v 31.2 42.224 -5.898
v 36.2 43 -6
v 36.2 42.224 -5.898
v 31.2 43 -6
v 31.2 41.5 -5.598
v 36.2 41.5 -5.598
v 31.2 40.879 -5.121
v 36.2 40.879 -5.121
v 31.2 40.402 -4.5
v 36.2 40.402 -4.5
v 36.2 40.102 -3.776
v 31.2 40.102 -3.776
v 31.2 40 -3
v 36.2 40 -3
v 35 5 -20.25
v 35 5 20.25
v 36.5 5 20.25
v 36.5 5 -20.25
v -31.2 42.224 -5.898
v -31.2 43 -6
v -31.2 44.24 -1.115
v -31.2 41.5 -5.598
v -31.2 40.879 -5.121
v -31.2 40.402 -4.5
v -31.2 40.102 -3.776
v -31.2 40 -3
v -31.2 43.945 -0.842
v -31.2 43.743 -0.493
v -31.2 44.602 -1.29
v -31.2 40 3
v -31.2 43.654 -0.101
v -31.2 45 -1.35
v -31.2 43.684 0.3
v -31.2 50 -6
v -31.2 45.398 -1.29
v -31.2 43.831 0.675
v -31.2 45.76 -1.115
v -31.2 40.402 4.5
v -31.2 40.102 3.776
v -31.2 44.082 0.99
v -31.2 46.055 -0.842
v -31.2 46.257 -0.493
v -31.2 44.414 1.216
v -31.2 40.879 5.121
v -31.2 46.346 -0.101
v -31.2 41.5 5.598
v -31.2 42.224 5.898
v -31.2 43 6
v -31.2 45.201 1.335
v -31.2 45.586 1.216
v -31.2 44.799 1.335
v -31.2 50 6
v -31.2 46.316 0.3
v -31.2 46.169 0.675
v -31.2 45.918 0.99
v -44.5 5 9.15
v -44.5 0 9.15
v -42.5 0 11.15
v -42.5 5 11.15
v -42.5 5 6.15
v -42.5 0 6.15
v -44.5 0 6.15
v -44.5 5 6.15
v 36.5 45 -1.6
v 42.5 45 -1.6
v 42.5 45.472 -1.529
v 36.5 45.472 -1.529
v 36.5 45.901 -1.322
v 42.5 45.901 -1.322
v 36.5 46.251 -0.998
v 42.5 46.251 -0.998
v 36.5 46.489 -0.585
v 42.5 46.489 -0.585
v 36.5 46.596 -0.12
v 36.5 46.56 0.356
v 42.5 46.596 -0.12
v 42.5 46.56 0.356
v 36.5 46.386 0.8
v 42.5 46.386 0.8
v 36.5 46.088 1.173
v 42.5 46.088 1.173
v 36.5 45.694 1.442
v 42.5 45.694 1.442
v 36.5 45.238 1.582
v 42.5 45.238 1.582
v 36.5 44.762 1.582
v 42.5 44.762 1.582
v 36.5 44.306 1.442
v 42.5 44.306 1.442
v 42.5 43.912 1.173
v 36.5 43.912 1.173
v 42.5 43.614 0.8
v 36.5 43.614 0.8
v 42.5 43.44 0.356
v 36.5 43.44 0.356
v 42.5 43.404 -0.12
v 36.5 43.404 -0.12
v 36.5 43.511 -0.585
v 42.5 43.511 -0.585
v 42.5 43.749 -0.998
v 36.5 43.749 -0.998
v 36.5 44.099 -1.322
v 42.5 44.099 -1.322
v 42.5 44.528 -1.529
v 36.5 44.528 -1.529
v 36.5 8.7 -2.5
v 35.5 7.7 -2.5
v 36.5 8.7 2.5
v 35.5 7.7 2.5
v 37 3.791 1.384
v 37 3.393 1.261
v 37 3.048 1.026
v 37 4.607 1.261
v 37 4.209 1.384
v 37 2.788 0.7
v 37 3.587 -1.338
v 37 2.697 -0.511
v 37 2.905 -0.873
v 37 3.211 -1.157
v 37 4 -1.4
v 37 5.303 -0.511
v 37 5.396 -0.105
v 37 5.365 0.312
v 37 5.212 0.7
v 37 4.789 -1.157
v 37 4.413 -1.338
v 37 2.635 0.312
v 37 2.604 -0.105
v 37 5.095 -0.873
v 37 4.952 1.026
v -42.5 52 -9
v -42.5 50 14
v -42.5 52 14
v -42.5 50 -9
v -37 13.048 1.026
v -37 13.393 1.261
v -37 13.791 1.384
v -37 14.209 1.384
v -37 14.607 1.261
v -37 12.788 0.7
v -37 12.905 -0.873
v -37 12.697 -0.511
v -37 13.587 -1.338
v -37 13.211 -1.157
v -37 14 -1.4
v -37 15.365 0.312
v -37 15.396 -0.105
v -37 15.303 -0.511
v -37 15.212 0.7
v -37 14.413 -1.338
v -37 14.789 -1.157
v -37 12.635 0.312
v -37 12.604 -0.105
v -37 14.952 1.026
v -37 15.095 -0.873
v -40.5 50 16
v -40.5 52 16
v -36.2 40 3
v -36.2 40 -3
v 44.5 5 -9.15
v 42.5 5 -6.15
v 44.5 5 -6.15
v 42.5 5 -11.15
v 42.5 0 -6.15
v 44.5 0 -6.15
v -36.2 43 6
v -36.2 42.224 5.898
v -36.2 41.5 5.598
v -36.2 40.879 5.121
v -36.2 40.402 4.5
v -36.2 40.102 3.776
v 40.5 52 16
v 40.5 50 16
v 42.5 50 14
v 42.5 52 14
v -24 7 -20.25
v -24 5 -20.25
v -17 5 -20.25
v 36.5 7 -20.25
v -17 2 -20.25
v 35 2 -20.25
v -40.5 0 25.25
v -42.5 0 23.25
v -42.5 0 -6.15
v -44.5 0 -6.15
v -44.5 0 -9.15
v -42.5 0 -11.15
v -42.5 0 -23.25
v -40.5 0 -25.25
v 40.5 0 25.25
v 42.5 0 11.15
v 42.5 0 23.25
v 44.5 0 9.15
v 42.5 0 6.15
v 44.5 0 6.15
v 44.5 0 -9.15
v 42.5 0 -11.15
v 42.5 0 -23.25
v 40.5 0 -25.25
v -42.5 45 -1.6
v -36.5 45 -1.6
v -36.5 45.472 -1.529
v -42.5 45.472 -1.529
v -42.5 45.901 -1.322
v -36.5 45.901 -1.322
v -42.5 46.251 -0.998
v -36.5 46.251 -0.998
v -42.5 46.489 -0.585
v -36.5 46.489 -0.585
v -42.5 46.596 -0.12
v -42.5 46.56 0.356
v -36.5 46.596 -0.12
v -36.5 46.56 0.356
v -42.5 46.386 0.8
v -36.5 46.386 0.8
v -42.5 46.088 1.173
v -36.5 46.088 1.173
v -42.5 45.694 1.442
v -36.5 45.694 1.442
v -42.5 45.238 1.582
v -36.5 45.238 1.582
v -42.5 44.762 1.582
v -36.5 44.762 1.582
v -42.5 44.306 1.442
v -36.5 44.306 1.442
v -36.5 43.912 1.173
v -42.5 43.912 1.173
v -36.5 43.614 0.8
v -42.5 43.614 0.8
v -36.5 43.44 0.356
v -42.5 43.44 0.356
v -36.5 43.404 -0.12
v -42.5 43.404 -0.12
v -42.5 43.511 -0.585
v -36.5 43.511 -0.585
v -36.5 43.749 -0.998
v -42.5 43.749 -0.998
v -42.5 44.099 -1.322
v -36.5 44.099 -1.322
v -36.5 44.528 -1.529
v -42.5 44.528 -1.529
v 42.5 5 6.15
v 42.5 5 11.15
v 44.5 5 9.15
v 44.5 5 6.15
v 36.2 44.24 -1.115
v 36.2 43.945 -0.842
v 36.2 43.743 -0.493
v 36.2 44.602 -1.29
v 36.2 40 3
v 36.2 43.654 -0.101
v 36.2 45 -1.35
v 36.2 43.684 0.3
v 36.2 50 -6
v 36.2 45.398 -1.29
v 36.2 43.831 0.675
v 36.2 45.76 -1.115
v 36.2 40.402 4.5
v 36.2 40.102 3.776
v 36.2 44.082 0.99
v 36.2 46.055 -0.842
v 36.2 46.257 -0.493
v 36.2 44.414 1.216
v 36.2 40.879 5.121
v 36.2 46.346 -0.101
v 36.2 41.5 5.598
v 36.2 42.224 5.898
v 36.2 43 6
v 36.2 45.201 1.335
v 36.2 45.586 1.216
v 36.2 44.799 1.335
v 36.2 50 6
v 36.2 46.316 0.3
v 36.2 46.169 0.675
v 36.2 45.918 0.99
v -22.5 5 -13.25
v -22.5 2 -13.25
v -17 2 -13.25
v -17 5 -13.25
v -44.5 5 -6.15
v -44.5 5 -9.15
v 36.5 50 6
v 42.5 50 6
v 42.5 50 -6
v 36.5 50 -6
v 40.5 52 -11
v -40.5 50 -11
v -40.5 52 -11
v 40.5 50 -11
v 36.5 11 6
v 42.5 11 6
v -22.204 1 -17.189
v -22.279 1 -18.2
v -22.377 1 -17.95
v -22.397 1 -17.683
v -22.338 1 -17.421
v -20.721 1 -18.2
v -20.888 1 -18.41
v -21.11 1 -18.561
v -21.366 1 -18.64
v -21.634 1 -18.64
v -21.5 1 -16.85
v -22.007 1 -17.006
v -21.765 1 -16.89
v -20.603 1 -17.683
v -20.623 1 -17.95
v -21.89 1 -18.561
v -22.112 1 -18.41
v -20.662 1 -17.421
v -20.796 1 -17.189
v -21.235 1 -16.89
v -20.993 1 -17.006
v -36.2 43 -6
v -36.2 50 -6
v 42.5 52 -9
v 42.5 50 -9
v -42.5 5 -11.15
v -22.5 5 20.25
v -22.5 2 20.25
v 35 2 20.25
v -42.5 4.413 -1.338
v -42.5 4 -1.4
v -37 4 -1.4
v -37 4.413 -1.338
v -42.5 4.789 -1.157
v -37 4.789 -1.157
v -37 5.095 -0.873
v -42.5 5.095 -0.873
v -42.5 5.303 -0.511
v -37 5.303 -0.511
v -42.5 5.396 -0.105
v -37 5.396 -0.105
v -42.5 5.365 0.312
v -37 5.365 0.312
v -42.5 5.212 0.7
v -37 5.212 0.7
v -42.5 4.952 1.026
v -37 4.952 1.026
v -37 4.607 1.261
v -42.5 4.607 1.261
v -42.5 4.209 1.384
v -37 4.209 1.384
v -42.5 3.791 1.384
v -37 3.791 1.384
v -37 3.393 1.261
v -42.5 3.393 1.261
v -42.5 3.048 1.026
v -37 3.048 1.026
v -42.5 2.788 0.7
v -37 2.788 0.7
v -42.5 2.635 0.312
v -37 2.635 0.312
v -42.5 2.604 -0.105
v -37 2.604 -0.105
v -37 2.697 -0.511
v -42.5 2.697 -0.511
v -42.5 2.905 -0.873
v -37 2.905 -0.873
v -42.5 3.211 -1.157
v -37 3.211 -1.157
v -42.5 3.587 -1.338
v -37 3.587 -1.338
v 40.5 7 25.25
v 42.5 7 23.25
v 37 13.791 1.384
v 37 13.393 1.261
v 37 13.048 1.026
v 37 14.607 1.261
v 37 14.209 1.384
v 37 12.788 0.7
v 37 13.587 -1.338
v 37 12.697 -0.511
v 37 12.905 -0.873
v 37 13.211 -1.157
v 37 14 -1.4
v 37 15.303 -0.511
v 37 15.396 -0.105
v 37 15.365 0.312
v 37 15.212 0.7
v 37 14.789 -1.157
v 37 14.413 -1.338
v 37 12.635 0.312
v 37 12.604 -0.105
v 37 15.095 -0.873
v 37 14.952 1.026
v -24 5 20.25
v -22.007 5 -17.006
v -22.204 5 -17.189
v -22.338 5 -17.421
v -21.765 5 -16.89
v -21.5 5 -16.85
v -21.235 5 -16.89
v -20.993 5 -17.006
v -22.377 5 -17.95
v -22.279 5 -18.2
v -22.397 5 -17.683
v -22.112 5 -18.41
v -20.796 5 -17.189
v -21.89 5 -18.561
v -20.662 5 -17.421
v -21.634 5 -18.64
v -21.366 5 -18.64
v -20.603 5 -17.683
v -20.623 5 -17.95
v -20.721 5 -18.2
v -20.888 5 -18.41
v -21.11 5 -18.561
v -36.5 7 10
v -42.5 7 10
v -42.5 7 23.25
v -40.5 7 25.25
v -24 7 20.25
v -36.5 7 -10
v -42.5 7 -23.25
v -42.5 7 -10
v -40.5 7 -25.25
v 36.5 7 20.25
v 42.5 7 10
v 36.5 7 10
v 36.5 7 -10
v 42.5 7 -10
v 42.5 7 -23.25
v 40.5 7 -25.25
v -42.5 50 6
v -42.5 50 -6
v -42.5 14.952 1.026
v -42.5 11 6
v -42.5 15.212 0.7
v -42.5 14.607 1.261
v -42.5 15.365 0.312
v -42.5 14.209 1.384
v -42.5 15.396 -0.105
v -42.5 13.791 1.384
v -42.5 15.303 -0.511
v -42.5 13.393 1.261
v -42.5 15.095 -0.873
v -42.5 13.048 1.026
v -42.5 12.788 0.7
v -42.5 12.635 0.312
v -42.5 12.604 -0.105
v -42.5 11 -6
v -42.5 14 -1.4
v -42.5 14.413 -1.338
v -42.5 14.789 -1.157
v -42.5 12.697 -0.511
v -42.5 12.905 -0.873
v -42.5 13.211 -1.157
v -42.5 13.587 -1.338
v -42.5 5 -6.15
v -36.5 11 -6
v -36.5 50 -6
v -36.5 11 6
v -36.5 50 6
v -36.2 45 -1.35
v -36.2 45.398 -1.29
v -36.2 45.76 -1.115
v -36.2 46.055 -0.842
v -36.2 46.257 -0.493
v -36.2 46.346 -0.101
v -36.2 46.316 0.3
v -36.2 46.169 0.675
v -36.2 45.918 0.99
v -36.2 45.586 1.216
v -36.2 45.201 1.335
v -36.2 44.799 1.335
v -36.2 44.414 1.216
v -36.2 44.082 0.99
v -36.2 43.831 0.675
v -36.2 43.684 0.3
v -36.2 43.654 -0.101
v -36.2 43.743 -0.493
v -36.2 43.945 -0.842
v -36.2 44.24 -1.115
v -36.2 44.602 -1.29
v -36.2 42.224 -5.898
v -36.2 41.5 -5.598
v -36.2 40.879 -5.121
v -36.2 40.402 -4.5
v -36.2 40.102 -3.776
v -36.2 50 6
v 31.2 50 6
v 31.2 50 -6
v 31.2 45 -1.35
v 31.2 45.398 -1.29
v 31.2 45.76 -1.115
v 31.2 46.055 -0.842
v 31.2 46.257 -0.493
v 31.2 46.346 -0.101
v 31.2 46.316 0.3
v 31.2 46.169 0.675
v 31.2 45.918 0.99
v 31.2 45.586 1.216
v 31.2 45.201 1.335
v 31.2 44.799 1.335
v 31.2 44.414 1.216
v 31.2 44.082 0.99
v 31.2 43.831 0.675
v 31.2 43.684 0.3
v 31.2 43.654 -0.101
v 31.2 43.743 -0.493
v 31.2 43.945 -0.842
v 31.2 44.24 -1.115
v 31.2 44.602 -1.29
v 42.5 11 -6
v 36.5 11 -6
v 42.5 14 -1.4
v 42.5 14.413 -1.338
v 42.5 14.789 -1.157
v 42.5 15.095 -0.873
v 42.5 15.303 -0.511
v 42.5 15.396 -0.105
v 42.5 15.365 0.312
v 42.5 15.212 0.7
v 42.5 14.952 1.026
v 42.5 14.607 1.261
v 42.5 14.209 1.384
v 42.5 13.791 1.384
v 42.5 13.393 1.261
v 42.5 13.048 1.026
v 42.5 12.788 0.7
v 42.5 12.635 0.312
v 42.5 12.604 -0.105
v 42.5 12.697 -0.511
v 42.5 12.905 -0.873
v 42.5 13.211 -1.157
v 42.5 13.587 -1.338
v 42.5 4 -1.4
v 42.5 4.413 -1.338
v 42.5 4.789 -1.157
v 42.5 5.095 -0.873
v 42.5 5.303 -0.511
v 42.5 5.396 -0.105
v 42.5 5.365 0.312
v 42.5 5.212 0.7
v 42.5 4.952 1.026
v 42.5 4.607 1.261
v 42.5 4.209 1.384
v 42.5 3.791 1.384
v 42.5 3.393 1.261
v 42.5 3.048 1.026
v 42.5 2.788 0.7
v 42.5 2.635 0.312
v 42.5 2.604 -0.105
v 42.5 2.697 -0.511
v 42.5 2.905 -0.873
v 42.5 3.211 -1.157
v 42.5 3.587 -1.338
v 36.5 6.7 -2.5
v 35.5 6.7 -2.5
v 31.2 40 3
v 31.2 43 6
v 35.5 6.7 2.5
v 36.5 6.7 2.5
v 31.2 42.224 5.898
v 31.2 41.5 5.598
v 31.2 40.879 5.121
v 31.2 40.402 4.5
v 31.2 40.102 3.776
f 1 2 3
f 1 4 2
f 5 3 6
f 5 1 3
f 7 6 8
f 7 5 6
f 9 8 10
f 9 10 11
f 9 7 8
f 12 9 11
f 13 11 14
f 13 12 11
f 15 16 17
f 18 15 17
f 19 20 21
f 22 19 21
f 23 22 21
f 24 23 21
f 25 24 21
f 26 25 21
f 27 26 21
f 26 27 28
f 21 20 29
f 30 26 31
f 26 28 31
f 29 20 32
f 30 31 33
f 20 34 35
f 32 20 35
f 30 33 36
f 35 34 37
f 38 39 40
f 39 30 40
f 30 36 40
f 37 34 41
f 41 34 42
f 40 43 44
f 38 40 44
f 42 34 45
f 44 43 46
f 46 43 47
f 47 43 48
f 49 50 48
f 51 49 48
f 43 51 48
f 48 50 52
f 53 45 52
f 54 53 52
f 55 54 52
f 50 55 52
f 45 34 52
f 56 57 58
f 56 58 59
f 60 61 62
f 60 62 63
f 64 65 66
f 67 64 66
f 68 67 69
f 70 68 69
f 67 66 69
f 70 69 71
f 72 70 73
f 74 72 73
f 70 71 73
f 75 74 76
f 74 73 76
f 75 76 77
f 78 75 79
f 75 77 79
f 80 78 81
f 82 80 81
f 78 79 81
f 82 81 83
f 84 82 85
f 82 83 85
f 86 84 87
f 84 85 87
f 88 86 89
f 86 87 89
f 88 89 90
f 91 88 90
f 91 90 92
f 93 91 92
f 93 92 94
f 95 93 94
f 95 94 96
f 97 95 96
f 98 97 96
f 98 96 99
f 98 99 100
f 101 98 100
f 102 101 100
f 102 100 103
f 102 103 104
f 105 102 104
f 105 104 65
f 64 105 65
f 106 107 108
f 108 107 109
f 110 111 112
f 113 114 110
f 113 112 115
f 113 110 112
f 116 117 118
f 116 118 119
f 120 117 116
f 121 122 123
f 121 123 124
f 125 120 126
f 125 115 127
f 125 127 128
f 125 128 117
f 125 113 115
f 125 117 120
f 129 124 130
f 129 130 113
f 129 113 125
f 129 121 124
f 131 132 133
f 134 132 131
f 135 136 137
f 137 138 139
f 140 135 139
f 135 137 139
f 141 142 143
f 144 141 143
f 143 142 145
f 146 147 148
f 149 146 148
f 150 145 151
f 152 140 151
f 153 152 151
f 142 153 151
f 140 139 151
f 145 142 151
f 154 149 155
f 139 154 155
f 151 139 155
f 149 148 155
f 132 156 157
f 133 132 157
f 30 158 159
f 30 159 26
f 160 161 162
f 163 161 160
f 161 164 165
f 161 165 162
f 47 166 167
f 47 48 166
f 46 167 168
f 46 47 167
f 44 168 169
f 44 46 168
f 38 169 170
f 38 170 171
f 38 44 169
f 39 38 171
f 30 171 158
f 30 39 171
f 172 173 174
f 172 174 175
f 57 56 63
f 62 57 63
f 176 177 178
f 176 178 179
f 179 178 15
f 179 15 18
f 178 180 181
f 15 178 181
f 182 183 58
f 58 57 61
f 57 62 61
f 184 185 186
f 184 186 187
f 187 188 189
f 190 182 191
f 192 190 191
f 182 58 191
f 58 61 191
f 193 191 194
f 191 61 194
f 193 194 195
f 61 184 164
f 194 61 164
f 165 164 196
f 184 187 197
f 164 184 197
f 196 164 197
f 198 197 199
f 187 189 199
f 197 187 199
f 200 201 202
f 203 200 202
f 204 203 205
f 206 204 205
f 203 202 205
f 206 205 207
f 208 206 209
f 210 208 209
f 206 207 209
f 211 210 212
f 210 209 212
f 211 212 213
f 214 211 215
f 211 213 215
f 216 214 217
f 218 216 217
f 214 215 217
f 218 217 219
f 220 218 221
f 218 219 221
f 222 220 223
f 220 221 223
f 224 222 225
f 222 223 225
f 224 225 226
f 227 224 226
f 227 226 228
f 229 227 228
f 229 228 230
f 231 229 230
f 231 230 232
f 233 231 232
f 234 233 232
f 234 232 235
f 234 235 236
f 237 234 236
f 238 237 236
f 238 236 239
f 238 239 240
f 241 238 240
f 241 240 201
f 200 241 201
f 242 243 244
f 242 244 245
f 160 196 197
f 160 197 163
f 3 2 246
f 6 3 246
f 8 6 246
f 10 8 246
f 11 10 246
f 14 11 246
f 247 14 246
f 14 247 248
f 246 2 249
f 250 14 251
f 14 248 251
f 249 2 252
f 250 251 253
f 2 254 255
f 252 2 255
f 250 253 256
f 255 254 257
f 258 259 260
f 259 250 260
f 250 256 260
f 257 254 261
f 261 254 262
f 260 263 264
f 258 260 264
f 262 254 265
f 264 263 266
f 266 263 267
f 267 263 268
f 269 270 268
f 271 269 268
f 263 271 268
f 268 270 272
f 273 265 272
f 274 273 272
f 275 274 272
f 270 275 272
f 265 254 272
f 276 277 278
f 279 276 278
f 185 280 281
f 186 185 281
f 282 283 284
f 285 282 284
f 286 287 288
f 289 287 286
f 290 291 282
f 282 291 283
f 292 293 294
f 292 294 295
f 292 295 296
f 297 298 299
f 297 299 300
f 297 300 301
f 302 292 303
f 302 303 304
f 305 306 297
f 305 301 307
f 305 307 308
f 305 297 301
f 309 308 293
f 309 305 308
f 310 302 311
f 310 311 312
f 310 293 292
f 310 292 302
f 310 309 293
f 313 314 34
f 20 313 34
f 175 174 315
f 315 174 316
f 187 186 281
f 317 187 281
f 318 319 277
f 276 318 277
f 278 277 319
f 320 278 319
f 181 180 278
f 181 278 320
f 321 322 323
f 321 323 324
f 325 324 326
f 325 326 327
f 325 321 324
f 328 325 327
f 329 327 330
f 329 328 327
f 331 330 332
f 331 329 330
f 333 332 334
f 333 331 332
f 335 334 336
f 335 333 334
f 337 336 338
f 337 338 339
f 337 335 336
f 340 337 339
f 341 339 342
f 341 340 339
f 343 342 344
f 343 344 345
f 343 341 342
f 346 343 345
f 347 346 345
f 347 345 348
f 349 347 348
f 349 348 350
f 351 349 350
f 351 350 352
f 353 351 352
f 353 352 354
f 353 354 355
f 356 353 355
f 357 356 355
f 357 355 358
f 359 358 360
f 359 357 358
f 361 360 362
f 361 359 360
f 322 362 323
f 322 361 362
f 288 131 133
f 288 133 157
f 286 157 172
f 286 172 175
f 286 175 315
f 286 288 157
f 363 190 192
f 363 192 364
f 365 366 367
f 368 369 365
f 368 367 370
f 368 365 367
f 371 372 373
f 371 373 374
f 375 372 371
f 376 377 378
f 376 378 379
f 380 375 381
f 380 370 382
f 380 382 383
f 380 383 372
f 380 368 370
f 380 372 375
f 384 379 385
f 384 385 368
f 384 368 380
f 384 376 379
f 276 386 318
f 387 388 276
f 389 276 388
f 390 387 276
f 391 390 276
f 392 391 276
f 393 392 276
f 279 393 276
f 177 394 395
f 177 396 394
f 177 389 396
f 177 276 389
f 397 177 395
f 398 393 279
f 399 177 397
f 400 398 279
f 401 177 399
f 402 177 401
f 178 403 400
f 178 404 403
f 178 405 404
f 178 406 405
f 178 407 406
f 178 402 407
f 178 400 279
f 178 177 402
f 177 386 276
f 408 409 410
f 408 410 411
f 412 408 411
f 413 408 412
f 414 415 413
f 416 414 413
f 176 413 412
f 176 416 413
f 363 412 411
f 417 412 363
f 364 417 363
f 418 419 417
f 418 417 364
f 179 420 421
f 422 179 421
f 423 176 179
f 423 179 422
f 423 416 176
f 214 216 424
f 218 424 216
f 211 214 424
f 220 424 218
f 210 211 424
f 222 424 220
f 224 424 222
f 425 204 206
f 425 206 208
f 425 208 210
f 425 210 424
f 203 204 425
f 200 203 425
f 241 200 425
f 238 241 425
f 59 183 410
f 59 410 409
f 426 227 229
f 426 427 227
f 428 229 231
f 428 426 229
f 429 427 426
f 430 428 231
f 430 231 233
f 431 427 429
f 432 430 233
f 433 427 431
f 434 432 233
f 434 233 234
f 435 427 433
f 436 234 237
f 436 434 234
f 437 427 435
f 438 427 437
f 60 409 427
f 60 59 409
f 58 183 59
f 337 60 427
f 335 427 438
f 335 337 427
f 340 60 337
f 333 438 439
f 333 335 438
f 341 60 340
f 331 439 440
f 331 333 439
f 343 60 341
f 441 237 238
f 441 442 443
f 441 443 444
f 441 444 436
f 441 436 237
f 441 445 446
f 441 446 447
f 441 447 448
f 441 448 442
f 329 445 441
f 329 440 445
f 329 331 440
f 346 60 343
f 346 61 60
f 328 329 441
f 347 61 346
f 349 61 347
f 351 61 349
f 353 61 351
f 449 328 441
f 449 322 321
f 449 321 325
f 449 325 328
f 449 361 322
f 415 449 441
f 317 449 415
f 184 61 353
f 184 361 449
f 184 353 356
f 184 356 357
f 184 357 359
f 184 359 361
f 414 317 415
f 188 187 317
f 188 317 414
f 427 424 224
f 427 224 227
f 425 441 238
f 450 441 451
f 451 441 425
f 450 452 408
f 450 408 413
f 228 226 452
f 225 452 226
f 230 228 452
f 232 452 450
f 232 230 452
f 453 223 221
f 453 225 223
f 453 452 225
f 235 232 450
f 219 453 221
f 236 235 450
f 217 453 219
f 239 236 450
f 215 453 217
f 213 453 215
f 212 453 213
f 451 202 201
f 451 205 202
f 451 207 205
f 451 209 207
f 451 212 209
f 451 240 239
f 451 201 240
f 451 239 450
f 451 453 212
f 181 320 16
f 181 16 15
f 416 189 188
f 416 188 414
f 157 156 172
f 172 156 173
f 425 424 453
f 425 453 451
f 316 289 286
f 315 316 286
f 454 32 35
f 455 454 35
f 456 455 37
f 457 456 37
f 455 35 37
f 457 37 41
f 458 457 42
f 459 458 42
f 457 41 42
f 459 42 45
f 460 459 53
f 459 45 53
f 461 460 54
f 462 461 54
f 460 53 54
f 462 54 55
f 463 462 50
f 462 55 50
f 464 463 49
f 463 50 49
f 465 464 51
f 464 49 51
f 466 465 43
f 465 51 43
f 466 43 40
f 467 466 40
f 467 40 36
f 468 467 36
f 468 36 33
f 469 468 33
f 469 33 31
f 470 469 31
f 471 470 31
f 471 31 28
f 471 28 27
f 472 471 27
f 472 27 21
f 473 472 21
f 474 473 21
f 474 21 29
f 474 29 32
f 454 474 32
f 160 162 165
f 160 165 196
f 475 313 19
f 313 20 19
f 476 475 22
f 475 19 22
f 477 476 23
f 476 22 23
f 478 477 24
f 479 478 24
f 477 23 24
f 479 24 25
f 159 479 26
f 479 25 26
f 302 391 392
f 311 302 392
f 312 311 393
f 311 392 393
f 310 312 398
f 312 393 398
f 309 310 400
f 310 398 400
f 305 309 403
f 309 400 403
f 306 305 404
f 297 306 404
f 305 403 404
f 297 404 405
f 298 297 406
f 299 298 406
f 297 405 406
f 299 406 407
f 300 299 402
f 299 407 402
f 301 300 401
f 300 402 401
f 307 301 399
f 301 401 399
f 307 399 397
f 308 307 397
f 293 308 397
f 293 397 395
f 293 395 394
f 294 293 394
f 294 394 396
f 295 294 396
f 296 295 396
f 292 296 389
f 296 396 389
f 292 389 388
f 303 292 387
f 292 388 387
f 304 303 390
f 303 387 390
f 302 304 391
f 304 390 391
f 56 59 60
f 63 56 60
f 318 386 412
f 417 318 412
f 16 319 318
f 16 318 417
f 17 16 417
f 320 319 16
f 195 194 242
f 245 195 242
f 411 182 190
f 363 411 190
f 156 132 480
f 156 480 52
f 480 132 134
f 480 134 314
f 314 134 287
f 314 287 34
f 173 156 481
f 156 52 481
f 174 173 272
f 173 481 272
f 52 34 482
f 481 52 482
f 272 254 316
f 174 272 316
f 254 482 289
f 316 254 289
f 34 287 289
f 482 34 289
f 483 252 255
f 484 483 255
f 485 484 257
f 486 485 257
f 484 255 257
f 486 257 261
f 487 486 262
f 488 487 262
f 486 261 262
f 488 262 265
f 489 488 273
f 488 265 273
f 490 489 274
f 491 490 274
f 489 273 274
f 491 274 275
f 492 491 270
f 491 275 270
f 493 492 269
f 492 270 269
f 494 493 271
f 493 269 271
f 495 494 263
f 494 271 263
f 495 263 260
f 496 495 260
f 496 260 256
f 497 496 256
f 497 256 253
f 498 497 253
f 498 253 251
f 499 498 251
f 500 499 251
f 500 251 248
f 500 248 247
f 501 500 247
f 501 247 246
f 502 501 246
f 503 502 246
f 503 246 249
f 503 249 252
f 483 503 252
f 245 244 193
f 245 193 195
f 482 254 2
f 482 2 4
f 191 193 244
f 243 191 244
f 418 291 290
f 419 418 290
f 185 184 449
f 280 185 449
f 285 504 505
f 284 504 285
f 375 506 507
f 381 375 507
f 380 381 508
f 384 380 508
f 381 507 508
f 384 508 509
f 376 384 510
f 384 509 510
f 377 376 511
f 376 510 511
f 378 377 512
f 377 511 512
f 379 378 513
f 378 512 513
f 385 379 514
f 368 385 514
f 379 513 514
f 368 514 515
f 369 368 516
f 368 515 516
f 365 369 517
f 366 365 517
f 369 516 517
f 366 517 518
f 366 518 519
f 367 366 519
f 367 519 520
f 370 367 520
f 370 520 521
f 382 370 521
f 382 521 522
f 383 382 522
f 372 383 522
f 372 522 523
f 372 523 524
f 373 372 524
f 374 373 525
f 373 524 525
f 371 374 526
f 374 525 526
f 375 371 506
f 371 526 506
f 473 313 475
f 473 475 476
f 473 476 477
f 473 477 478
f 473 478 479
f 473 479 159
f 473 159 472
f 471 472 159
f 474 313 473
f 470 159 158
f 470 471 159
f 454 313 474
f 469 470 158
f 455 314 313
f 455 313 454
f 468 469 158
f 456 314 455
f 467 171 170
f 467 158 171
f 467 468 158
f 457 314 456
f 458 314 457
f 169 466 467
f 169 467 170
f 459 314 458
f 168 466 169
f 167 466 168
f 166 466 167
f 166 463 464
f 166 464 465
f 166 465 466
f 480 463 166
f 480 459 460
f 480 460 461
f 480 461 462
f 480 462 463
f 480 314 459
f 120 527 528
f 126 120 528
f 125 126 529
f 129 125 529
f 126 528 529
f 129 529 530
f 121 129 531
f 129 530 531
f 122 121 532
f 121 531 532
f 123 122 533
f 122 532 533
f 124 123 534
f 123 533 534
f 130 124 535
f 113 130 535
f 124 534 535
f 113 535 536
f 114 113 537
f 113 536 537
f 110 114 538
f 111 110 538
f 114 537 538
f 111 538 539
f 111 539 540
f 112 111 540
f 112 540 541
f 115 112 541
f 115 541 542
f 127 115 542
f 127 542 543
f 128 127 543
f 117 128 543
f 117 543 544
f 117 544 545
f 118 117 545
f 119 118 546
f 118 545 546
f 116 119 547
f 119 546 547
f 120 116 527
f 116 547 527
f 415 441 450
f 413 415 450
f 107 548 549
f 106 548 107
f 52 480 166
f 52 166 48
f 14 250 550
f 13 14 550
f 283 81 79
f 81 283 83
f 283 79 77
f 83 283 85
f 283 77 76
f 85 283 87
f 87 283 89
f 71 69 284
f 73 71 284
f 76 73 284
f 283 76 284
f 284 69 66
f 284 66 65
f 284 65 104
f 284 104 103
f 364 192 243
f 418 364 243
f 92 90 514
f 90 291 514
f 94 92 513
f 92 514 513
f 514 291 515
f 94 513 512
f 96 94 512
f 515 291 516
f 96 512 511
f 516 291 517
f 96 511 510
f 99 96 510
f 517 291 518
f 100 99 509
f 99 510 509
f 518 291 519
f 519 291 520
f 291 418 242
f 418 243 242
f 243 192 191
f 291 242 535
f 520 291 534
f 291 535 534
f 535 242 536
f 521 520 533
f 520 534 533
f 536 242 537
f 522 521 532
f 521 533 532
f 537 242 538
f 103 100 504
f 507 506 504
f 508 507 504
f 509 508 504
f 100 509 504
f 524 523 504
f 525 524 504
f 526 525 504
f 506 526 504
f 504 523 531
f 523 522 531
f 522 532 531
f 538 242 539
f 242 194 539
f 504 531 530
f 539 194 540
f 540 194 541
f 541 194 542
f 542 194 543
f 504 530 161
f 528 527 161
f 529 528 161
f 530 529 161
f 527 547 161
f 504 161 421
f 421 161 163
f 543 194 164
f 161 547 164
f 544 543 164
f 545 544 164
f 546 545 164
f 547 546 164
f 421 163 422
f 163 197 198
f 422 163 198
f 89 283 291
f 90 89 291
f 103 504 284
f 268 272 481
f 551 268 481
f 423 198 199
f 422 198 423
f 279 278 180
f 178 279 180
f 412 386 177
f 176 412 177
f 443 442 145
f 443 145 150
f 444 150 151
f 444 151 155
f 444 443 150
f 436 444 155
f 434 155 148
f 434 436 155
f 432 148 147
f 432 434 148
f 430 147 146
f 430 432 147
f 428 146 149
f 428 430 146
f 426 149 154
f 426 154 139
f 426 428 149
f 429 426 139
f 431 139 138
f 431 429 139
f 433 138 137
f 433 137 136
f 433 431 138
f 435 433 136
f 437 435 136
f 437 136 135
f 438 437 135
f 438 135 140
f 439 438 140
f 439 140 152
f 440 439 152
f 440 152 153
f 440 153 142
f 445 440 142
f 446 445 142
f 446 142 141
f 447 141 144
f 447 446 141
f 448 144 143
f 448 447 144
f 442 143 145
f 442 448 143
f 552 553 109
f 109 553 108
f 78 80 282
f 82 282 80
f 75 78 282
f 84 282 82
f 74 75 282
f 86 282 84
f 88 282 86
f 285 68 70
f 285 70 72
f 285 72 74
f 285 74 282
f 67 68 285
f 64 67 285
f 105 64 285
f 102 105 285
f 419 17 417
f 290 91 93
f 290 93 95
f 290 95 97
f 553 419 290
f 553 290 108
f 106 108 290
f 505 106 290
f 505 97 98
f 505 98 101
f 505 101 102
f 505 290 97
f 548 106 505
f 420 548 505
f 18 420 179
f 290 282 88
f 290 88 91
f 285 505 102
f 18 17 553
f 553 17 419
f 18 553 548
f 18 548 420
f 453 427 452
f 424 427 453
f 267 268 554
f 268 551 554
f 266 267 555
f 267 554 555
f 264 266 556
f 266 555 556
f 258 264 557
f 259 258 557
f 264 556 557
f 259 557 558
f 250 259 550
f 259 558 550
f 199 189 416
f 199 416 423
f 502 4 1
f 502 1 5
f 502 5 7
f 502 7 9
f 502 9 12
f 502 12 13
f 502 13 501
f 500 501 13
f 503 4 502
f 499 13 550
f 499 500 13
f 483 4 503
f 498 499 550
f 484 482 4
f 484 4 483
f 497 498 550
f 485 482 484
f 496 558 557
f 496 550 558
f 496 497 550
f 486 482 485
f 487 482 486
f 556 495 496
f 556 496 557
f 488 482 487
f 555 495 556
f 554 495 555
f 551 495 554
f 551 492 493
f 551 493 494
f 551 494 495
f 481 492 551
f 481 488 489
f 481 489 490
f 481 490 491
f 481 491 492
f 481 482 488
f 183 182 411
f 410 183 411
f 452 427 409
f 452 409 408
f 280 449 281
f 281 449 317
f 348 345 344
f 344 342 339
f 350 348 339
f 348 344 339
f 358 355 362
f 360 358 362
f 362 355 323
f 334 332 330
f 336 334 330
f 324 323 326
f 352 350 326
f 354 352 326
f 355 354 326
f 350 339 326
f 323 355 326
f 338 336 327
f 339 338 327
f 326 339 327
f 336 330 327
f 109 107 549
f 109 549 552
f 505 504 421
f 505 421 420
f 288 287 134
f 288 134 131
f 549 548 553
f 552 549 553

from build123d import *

# Parameters (mm, degrees)
SCHIZZO1_W                    = 85
SCHIZZO1_H                    = 50.5
SCHIZZO1_W_2                  = 60.5
SCHIZZO1_H_2                  = 40.5
ESTRUSIONE_ESTRUSIONE1_DEPTH  = 7
SCHIZZO1_3_W                  = 60.5
SCHIZZO1_3_H                  = 40.5
ESTRUSIONE_ESTRUSIONE2_DEPTH  = 2
SCHIZZO3_W                    = 1.5
SCHIZZO3_H                    = 40.5
ESTRUSIONE_ESTRUSIONE3_DEPTH  = 3
SCHIZZO4_W                    = 12
SCHIZZO4_H                    = 43
ESTRUSIONE_ESTRUSIONE4_DEPTH  = 6
ESTRUSIONE_ESTRUSIONE5_START  = -85
SCHIZZO4_2_W                  = 12
SCHIZZO4_2_H                  = 43
ESTRUSIONE_ESTRUSIONE5_DEPTH  = 6
SCHIZZO5_R                    = 1.4
TAGLIO_ESTRUSIONE1_DEPTH      = 5.5
SMUSSO1_SIZE                  = 4
SCHIZZO7_W                    = 3
SCHIZZO7_H                    = 5
ESTRUSIONE_ESTRUSIONE6_DEPTH  = 2
SMUSSO2_SIZE                  = 2
SMUSSO3_SIZE                  = 2
SCHIZZO8_W                    = 5
SCHIZZO8_H                    = 1
ESTRUSIONE_ESTRUSIONE7_DEPTH  = 1
SMUSSO4_SIZE                  = 1
SCHIZZO9_W                    = 5.5
SCHIZZO9_H                    = 7
ESTRUSIONE_ESTRUSIONE8_DEPTH  = 3
SCHIZZO10_R                   = 0.9
TAGLIO_ESTRUSIONE2_DEPTH      = 4
SCHIZZO11_R                   = 1.6
TAGLIO_ESTRUSIONE3_DEPTH      = 104.472520507
SCHIZZO13_W                   = 85
SCHIZZO13_H                   = 27
ESTRUSIONE_ESTRUSIONE10_DEPTH = 2
SCHIZZO15_W                   = 5
SCHIZZO15_H                   = 12
ESTRUSIONE_ESTRUSIONE11_DEPTH = 10
SCHIZZO16_R                   = 1.35
TAGLIO_ESTRUSIONE4_DEPTH      = 100.267580307
RACCORDO1_R                   = 3
SMUSSO5_SIZE                  = 2


with BuildPart() as part:
    # Schizzo1 → Estrusione-Estrusione1 (new body)
    with BuildSketch(Plane(origin=(0, 0, 0), x_dir=(1, 0, 0), z_dir=(0, 1, 0))):
        Rectangle(SCHIZZO1_W, SCHIZZO1_H)
        with Locations((6.25, 0)):
            Rectangle(SCHIZZO1_W_2, SCHIZZO1_H_2, mode=Mode.SUBTRACT)
    extrude(amount=ESTRUSIONE_ESTRUSIONE1_DEPTH)

    # Schizzo1<3> → Estrusione-Estrusione2 (add)
    with BuildSketch(Plane(origin=(0, 0, 0), x_dir=(1, 0, 0), z_dir=(0, 1, 0))):
        with Locations((6.25, 0)):
            Rectangle(SCHIZZO1_3_W, SCHIZZO1_3_H)
    extrude(amount=ESTRUSIONE_ESTRUSIONE2_DEPTH)

    # Schizzo3 → Estrusione-Estrusione3 (add)
    with BuildSketch(Plane(origin=(0, 2, 0), x_dir=(1, 0, 0), z_dir=(0, 1, 0))):
        with Locations((-23.25, 0)):
            Rectangle(SCHIZZO3_W, SCHIZZO3_H)
        with Locations((35.75, 0)):
            Rectangle(SCHIZZO3_W, SCHIZZO3_H)
    extrude(amount=ESTRUSIONE_ESTRUSIONE3_DEPTH)

    # Schizzo4 → Estrusione-Estrusione4 (add)
    with BuildSketch(Plane(origin=(42.5, 0, 0), x_dir=(0, 0, -1), z_dir=(1, 0, 0))):
        with Locations((0, 28.5)):
            Rectangle(SCHIZZO4_W, SCHIZZO4_H)
    extrude(amount=-ESTRUSIONE_ESTRUSIONE4_DEPTH)

    # Schizzo4<2> → Estrusione-Estrusione5 (add)
    with BuildSketch(Plane(origin=(42.5, 0, 0), x_dir=(0, 0, -1), z_dir=(1, 0, 0)).offset(ESTRUSIONE_ESTRUSIONE5_START)):
        with Locations((0, 28.5)):
            Rectangle(SCHIZZO4_2_W, SCHIZZO4_2_H)
    extrude(amount=ESTRUSIONE_ESTRUSIONE5_DEPTH)

    # Schizzo5 → Taglio-Estrusione1 (cut)
    with BuildSketch(Plane(origin=(42.5, 0, 0), x_dir=(0, 0, -1), z_dir=(1, 0, 0))):
        with Locations((0, 4)):
            Circle(SCHIZZO5_R)
        with Locations((0, 14)):
            Circle(SCHIZZO5_R)
    taglio_estrusione1 = extrude(amount=-TAGLIO_ESTRUSIONE1_DEPTH, mode=Mode.SUBTRACT)

    # Specchia1: Taglio-Estrusione1 across plane
    add(taglio_estrusione1.mirror(Plane(origin=(0, 0, 0), x_dir=(0, 0, 1), z_dir=(1, 0, 0))), mode=Mode.SUBTRACT)

    # Smusso1
    smusso1_edges = [part.edges().sort_by_distance(p)[0] for p in [
        (39.5, 7, -6),
        (39.5, 7, 6),
        (-39.5, 7, 6),
        (-39.5, 7, -6),
    ]]
    chamfer(smusso1_edges, length=SMUSSO1_SIZE)

    # Schizzo7 → Estrusione-Estrusione6 (add)
    with BuildSketch(Plane(origin=(42.5, 0, 0), x_dir=(0, 0, -1), z_dir=(1, 0, 0))):
        with Locations((-7.65, 2.5)):
            Rectangle(SCHIZZO7_W, SCHIZZO7_H)
        with Locations((7.65, 2.5)):
            Rectangle(SCHIZZO7_W, SCHIZZO7_H)
    estrusione_estrusione6 = extrude(amount=ESTRUSIONE_ESTRUSIONE6_DEPTH)

    # Specchia2: Estrusione-Estrusione6 across plane
    add(estrusione_estrusione6.mirror(Plane(origin=(0, 0, 0), x_dir=(0, 0, 1), z_dir=(1, 0, 0))))

    # Smusso2
    smusso2_edges = [part.edges().sort_by_distance(p)[0] for p in [
        (42.5, 2.5, -9.15),
        (42.5, 2.5, 9.15),
        (-42.5, 2.5, -9.15),
        (-42.5, 2.5, 9.15),
    ]]
    chamfer(smusso2_edges, length=SMUSSO2_SIZE - 0.0001)  # a hair under: the kernel refuses the full size

    # Smusso3
    smusso3_edges = [part.edges().sort_by_distance(p)[0] for p in [
        (42.5, 3.5, 25.25),
        (-42.5, 3.5, 25.25),
        (-42.5, 3.5, -25.25),
        (42.5, 3.5, -25.25),
    ]]
    chamfer(smusso3_edges, length=SMUSSO3_SIZE)

    # Schizzo8 → Estrusione-Estrusione7 (add)
    with BuildSketch(Plane.ZY.offset(-36.5)):
        with Locations((0, 7.2)):
            Rectangle(SCHIZZO8_W, SCHIZZO8_H)
    extrude(amount=ESTRUSIONE_ESTRUSIONE7_DEPTH)

    # Smusso4
    smusso4_edges = [part.edges().sort_by_distance(p)[0] for p in [
        (36.5, 7.7, 0),
    ]]
    chamfer(smusso4_edges, length=SMUSSO4_SIZE - 0.0001)  # a hair under: the kernel refuses the full size

    # Schizzo9 → Estrusione-Estrusione8 (add)
    with BuildSketch(Plane(origin=(0, 2, 0), x_dir=(1, 0, 0), z_dir=(0, 1, 0))):
        with Locations((-19.75, 16.75)):
            Rectangle(SCHIZZO9_W, SCHIZZO9_H)
    extrude(amount=ESTRUSIONE_ESTRUSIONE8_DEPTH)

    # Schizzo10 → Taglio-Estrusione2 (cut)
    with BuildSketch(Plane(origin=(0, 5, 0), x_dir=(1, 0, 0), z_dir=(0, 1, 0))):
        with Locations(Location((-21.5, 17.75, 0), (0, 0, 270))):
            Circle(SCHIZZO10_R)
    extrude(amount=-TAGLIO_ESTRUSIONE2_DEPTH, mode=Mode.SUBTRACT)

    # Schizzo11 → Taglio-Estrusione3 (cut, through all)
    with BuildSketch(Plane(origin=(42.5, 0, 0), x_dir=(0, 0, -1), z_dir=(1, 0, 0))):
        with Locations((0, 45)):
            Circle(SCHIZZO11_R)
    extrude(amount=-TAGLIO_ESTRUSIONE3_DEPTH, mode=Mode.SUBTRACT)


with BuildPart() as body_2:
    # Schizzo13 → Estrusione-Estrusione10 (new body)
    with BuildSketch(Plane(origin=(0, 50, 0), x_dir=(1, 0, 0), z_dir=(0, 1, 0))):
        with Locations((0, -2.5)):
            Rectangle(SCHIZZO13_W, SCHIZZO13_H)
    extrude(amount=ESTRUSIONE_ESTRUSIONE10_DEPTH)

    # Schizzo15 → Estrusione-Estrusione11 (add)
    with BuildSketch(Plane.XZ.offset(-50)):
        with Locations((-33.7, 0)):
            Rectangle(SCHIZZO15_W, SCHIZZO15_H)
    estrusione_estrusione11 = extrude(amount=ESTRUSIONE_ESTRUSIONE11_DEPTH)

    # Specchia4: Estrusione-Estrusione11 across plane
    add(estrusione_estrusione11.mirror(Plane(origin=(0, 0, 0), x_dir=(0, 0, 1), z_dir=(1, 0, 0))))

    # Schizzo16 → Taglio-Estrusione4 (cut, through all)
    with BuildSketch(Plane(origin=(36.2, 0, 0), x_dir=(0, 0, -1), z_dir=(1, 0, 0))):
        with Locations((0, 45)):
            Circle(SCHIZZO16_R)
    extrude(amount=-TAGLIO_ESTRUSIONE4_DEPTH, mode=Mode.SUBTRACT)

    # Raccordo1
    raccordo1_edges = [body_2.edges().sort_by_distance(p)[0] for p in [
        (-33.7, 40, -6),
        (-33.7, 40, 6),
        (33.7, 40, 6),
        (33.7, 40, -6),
    ]]
    fillet(raccordo1_edges, radius=RACCORDO1_R)

    # Smusso5
    smusso5_edges = [body_2.edges().sort_by_distance(p)[0] for p in [
        (-42.5, 51, -11),
        (42.5, 51, -11),
        (42.5, 51, 16),
        (-42.5, 51, 16),
    ]]
    chamfer(smusso5_edges, length=SMUSSO5_SIZE)


solid = Compound([part.part, body_2.part])
